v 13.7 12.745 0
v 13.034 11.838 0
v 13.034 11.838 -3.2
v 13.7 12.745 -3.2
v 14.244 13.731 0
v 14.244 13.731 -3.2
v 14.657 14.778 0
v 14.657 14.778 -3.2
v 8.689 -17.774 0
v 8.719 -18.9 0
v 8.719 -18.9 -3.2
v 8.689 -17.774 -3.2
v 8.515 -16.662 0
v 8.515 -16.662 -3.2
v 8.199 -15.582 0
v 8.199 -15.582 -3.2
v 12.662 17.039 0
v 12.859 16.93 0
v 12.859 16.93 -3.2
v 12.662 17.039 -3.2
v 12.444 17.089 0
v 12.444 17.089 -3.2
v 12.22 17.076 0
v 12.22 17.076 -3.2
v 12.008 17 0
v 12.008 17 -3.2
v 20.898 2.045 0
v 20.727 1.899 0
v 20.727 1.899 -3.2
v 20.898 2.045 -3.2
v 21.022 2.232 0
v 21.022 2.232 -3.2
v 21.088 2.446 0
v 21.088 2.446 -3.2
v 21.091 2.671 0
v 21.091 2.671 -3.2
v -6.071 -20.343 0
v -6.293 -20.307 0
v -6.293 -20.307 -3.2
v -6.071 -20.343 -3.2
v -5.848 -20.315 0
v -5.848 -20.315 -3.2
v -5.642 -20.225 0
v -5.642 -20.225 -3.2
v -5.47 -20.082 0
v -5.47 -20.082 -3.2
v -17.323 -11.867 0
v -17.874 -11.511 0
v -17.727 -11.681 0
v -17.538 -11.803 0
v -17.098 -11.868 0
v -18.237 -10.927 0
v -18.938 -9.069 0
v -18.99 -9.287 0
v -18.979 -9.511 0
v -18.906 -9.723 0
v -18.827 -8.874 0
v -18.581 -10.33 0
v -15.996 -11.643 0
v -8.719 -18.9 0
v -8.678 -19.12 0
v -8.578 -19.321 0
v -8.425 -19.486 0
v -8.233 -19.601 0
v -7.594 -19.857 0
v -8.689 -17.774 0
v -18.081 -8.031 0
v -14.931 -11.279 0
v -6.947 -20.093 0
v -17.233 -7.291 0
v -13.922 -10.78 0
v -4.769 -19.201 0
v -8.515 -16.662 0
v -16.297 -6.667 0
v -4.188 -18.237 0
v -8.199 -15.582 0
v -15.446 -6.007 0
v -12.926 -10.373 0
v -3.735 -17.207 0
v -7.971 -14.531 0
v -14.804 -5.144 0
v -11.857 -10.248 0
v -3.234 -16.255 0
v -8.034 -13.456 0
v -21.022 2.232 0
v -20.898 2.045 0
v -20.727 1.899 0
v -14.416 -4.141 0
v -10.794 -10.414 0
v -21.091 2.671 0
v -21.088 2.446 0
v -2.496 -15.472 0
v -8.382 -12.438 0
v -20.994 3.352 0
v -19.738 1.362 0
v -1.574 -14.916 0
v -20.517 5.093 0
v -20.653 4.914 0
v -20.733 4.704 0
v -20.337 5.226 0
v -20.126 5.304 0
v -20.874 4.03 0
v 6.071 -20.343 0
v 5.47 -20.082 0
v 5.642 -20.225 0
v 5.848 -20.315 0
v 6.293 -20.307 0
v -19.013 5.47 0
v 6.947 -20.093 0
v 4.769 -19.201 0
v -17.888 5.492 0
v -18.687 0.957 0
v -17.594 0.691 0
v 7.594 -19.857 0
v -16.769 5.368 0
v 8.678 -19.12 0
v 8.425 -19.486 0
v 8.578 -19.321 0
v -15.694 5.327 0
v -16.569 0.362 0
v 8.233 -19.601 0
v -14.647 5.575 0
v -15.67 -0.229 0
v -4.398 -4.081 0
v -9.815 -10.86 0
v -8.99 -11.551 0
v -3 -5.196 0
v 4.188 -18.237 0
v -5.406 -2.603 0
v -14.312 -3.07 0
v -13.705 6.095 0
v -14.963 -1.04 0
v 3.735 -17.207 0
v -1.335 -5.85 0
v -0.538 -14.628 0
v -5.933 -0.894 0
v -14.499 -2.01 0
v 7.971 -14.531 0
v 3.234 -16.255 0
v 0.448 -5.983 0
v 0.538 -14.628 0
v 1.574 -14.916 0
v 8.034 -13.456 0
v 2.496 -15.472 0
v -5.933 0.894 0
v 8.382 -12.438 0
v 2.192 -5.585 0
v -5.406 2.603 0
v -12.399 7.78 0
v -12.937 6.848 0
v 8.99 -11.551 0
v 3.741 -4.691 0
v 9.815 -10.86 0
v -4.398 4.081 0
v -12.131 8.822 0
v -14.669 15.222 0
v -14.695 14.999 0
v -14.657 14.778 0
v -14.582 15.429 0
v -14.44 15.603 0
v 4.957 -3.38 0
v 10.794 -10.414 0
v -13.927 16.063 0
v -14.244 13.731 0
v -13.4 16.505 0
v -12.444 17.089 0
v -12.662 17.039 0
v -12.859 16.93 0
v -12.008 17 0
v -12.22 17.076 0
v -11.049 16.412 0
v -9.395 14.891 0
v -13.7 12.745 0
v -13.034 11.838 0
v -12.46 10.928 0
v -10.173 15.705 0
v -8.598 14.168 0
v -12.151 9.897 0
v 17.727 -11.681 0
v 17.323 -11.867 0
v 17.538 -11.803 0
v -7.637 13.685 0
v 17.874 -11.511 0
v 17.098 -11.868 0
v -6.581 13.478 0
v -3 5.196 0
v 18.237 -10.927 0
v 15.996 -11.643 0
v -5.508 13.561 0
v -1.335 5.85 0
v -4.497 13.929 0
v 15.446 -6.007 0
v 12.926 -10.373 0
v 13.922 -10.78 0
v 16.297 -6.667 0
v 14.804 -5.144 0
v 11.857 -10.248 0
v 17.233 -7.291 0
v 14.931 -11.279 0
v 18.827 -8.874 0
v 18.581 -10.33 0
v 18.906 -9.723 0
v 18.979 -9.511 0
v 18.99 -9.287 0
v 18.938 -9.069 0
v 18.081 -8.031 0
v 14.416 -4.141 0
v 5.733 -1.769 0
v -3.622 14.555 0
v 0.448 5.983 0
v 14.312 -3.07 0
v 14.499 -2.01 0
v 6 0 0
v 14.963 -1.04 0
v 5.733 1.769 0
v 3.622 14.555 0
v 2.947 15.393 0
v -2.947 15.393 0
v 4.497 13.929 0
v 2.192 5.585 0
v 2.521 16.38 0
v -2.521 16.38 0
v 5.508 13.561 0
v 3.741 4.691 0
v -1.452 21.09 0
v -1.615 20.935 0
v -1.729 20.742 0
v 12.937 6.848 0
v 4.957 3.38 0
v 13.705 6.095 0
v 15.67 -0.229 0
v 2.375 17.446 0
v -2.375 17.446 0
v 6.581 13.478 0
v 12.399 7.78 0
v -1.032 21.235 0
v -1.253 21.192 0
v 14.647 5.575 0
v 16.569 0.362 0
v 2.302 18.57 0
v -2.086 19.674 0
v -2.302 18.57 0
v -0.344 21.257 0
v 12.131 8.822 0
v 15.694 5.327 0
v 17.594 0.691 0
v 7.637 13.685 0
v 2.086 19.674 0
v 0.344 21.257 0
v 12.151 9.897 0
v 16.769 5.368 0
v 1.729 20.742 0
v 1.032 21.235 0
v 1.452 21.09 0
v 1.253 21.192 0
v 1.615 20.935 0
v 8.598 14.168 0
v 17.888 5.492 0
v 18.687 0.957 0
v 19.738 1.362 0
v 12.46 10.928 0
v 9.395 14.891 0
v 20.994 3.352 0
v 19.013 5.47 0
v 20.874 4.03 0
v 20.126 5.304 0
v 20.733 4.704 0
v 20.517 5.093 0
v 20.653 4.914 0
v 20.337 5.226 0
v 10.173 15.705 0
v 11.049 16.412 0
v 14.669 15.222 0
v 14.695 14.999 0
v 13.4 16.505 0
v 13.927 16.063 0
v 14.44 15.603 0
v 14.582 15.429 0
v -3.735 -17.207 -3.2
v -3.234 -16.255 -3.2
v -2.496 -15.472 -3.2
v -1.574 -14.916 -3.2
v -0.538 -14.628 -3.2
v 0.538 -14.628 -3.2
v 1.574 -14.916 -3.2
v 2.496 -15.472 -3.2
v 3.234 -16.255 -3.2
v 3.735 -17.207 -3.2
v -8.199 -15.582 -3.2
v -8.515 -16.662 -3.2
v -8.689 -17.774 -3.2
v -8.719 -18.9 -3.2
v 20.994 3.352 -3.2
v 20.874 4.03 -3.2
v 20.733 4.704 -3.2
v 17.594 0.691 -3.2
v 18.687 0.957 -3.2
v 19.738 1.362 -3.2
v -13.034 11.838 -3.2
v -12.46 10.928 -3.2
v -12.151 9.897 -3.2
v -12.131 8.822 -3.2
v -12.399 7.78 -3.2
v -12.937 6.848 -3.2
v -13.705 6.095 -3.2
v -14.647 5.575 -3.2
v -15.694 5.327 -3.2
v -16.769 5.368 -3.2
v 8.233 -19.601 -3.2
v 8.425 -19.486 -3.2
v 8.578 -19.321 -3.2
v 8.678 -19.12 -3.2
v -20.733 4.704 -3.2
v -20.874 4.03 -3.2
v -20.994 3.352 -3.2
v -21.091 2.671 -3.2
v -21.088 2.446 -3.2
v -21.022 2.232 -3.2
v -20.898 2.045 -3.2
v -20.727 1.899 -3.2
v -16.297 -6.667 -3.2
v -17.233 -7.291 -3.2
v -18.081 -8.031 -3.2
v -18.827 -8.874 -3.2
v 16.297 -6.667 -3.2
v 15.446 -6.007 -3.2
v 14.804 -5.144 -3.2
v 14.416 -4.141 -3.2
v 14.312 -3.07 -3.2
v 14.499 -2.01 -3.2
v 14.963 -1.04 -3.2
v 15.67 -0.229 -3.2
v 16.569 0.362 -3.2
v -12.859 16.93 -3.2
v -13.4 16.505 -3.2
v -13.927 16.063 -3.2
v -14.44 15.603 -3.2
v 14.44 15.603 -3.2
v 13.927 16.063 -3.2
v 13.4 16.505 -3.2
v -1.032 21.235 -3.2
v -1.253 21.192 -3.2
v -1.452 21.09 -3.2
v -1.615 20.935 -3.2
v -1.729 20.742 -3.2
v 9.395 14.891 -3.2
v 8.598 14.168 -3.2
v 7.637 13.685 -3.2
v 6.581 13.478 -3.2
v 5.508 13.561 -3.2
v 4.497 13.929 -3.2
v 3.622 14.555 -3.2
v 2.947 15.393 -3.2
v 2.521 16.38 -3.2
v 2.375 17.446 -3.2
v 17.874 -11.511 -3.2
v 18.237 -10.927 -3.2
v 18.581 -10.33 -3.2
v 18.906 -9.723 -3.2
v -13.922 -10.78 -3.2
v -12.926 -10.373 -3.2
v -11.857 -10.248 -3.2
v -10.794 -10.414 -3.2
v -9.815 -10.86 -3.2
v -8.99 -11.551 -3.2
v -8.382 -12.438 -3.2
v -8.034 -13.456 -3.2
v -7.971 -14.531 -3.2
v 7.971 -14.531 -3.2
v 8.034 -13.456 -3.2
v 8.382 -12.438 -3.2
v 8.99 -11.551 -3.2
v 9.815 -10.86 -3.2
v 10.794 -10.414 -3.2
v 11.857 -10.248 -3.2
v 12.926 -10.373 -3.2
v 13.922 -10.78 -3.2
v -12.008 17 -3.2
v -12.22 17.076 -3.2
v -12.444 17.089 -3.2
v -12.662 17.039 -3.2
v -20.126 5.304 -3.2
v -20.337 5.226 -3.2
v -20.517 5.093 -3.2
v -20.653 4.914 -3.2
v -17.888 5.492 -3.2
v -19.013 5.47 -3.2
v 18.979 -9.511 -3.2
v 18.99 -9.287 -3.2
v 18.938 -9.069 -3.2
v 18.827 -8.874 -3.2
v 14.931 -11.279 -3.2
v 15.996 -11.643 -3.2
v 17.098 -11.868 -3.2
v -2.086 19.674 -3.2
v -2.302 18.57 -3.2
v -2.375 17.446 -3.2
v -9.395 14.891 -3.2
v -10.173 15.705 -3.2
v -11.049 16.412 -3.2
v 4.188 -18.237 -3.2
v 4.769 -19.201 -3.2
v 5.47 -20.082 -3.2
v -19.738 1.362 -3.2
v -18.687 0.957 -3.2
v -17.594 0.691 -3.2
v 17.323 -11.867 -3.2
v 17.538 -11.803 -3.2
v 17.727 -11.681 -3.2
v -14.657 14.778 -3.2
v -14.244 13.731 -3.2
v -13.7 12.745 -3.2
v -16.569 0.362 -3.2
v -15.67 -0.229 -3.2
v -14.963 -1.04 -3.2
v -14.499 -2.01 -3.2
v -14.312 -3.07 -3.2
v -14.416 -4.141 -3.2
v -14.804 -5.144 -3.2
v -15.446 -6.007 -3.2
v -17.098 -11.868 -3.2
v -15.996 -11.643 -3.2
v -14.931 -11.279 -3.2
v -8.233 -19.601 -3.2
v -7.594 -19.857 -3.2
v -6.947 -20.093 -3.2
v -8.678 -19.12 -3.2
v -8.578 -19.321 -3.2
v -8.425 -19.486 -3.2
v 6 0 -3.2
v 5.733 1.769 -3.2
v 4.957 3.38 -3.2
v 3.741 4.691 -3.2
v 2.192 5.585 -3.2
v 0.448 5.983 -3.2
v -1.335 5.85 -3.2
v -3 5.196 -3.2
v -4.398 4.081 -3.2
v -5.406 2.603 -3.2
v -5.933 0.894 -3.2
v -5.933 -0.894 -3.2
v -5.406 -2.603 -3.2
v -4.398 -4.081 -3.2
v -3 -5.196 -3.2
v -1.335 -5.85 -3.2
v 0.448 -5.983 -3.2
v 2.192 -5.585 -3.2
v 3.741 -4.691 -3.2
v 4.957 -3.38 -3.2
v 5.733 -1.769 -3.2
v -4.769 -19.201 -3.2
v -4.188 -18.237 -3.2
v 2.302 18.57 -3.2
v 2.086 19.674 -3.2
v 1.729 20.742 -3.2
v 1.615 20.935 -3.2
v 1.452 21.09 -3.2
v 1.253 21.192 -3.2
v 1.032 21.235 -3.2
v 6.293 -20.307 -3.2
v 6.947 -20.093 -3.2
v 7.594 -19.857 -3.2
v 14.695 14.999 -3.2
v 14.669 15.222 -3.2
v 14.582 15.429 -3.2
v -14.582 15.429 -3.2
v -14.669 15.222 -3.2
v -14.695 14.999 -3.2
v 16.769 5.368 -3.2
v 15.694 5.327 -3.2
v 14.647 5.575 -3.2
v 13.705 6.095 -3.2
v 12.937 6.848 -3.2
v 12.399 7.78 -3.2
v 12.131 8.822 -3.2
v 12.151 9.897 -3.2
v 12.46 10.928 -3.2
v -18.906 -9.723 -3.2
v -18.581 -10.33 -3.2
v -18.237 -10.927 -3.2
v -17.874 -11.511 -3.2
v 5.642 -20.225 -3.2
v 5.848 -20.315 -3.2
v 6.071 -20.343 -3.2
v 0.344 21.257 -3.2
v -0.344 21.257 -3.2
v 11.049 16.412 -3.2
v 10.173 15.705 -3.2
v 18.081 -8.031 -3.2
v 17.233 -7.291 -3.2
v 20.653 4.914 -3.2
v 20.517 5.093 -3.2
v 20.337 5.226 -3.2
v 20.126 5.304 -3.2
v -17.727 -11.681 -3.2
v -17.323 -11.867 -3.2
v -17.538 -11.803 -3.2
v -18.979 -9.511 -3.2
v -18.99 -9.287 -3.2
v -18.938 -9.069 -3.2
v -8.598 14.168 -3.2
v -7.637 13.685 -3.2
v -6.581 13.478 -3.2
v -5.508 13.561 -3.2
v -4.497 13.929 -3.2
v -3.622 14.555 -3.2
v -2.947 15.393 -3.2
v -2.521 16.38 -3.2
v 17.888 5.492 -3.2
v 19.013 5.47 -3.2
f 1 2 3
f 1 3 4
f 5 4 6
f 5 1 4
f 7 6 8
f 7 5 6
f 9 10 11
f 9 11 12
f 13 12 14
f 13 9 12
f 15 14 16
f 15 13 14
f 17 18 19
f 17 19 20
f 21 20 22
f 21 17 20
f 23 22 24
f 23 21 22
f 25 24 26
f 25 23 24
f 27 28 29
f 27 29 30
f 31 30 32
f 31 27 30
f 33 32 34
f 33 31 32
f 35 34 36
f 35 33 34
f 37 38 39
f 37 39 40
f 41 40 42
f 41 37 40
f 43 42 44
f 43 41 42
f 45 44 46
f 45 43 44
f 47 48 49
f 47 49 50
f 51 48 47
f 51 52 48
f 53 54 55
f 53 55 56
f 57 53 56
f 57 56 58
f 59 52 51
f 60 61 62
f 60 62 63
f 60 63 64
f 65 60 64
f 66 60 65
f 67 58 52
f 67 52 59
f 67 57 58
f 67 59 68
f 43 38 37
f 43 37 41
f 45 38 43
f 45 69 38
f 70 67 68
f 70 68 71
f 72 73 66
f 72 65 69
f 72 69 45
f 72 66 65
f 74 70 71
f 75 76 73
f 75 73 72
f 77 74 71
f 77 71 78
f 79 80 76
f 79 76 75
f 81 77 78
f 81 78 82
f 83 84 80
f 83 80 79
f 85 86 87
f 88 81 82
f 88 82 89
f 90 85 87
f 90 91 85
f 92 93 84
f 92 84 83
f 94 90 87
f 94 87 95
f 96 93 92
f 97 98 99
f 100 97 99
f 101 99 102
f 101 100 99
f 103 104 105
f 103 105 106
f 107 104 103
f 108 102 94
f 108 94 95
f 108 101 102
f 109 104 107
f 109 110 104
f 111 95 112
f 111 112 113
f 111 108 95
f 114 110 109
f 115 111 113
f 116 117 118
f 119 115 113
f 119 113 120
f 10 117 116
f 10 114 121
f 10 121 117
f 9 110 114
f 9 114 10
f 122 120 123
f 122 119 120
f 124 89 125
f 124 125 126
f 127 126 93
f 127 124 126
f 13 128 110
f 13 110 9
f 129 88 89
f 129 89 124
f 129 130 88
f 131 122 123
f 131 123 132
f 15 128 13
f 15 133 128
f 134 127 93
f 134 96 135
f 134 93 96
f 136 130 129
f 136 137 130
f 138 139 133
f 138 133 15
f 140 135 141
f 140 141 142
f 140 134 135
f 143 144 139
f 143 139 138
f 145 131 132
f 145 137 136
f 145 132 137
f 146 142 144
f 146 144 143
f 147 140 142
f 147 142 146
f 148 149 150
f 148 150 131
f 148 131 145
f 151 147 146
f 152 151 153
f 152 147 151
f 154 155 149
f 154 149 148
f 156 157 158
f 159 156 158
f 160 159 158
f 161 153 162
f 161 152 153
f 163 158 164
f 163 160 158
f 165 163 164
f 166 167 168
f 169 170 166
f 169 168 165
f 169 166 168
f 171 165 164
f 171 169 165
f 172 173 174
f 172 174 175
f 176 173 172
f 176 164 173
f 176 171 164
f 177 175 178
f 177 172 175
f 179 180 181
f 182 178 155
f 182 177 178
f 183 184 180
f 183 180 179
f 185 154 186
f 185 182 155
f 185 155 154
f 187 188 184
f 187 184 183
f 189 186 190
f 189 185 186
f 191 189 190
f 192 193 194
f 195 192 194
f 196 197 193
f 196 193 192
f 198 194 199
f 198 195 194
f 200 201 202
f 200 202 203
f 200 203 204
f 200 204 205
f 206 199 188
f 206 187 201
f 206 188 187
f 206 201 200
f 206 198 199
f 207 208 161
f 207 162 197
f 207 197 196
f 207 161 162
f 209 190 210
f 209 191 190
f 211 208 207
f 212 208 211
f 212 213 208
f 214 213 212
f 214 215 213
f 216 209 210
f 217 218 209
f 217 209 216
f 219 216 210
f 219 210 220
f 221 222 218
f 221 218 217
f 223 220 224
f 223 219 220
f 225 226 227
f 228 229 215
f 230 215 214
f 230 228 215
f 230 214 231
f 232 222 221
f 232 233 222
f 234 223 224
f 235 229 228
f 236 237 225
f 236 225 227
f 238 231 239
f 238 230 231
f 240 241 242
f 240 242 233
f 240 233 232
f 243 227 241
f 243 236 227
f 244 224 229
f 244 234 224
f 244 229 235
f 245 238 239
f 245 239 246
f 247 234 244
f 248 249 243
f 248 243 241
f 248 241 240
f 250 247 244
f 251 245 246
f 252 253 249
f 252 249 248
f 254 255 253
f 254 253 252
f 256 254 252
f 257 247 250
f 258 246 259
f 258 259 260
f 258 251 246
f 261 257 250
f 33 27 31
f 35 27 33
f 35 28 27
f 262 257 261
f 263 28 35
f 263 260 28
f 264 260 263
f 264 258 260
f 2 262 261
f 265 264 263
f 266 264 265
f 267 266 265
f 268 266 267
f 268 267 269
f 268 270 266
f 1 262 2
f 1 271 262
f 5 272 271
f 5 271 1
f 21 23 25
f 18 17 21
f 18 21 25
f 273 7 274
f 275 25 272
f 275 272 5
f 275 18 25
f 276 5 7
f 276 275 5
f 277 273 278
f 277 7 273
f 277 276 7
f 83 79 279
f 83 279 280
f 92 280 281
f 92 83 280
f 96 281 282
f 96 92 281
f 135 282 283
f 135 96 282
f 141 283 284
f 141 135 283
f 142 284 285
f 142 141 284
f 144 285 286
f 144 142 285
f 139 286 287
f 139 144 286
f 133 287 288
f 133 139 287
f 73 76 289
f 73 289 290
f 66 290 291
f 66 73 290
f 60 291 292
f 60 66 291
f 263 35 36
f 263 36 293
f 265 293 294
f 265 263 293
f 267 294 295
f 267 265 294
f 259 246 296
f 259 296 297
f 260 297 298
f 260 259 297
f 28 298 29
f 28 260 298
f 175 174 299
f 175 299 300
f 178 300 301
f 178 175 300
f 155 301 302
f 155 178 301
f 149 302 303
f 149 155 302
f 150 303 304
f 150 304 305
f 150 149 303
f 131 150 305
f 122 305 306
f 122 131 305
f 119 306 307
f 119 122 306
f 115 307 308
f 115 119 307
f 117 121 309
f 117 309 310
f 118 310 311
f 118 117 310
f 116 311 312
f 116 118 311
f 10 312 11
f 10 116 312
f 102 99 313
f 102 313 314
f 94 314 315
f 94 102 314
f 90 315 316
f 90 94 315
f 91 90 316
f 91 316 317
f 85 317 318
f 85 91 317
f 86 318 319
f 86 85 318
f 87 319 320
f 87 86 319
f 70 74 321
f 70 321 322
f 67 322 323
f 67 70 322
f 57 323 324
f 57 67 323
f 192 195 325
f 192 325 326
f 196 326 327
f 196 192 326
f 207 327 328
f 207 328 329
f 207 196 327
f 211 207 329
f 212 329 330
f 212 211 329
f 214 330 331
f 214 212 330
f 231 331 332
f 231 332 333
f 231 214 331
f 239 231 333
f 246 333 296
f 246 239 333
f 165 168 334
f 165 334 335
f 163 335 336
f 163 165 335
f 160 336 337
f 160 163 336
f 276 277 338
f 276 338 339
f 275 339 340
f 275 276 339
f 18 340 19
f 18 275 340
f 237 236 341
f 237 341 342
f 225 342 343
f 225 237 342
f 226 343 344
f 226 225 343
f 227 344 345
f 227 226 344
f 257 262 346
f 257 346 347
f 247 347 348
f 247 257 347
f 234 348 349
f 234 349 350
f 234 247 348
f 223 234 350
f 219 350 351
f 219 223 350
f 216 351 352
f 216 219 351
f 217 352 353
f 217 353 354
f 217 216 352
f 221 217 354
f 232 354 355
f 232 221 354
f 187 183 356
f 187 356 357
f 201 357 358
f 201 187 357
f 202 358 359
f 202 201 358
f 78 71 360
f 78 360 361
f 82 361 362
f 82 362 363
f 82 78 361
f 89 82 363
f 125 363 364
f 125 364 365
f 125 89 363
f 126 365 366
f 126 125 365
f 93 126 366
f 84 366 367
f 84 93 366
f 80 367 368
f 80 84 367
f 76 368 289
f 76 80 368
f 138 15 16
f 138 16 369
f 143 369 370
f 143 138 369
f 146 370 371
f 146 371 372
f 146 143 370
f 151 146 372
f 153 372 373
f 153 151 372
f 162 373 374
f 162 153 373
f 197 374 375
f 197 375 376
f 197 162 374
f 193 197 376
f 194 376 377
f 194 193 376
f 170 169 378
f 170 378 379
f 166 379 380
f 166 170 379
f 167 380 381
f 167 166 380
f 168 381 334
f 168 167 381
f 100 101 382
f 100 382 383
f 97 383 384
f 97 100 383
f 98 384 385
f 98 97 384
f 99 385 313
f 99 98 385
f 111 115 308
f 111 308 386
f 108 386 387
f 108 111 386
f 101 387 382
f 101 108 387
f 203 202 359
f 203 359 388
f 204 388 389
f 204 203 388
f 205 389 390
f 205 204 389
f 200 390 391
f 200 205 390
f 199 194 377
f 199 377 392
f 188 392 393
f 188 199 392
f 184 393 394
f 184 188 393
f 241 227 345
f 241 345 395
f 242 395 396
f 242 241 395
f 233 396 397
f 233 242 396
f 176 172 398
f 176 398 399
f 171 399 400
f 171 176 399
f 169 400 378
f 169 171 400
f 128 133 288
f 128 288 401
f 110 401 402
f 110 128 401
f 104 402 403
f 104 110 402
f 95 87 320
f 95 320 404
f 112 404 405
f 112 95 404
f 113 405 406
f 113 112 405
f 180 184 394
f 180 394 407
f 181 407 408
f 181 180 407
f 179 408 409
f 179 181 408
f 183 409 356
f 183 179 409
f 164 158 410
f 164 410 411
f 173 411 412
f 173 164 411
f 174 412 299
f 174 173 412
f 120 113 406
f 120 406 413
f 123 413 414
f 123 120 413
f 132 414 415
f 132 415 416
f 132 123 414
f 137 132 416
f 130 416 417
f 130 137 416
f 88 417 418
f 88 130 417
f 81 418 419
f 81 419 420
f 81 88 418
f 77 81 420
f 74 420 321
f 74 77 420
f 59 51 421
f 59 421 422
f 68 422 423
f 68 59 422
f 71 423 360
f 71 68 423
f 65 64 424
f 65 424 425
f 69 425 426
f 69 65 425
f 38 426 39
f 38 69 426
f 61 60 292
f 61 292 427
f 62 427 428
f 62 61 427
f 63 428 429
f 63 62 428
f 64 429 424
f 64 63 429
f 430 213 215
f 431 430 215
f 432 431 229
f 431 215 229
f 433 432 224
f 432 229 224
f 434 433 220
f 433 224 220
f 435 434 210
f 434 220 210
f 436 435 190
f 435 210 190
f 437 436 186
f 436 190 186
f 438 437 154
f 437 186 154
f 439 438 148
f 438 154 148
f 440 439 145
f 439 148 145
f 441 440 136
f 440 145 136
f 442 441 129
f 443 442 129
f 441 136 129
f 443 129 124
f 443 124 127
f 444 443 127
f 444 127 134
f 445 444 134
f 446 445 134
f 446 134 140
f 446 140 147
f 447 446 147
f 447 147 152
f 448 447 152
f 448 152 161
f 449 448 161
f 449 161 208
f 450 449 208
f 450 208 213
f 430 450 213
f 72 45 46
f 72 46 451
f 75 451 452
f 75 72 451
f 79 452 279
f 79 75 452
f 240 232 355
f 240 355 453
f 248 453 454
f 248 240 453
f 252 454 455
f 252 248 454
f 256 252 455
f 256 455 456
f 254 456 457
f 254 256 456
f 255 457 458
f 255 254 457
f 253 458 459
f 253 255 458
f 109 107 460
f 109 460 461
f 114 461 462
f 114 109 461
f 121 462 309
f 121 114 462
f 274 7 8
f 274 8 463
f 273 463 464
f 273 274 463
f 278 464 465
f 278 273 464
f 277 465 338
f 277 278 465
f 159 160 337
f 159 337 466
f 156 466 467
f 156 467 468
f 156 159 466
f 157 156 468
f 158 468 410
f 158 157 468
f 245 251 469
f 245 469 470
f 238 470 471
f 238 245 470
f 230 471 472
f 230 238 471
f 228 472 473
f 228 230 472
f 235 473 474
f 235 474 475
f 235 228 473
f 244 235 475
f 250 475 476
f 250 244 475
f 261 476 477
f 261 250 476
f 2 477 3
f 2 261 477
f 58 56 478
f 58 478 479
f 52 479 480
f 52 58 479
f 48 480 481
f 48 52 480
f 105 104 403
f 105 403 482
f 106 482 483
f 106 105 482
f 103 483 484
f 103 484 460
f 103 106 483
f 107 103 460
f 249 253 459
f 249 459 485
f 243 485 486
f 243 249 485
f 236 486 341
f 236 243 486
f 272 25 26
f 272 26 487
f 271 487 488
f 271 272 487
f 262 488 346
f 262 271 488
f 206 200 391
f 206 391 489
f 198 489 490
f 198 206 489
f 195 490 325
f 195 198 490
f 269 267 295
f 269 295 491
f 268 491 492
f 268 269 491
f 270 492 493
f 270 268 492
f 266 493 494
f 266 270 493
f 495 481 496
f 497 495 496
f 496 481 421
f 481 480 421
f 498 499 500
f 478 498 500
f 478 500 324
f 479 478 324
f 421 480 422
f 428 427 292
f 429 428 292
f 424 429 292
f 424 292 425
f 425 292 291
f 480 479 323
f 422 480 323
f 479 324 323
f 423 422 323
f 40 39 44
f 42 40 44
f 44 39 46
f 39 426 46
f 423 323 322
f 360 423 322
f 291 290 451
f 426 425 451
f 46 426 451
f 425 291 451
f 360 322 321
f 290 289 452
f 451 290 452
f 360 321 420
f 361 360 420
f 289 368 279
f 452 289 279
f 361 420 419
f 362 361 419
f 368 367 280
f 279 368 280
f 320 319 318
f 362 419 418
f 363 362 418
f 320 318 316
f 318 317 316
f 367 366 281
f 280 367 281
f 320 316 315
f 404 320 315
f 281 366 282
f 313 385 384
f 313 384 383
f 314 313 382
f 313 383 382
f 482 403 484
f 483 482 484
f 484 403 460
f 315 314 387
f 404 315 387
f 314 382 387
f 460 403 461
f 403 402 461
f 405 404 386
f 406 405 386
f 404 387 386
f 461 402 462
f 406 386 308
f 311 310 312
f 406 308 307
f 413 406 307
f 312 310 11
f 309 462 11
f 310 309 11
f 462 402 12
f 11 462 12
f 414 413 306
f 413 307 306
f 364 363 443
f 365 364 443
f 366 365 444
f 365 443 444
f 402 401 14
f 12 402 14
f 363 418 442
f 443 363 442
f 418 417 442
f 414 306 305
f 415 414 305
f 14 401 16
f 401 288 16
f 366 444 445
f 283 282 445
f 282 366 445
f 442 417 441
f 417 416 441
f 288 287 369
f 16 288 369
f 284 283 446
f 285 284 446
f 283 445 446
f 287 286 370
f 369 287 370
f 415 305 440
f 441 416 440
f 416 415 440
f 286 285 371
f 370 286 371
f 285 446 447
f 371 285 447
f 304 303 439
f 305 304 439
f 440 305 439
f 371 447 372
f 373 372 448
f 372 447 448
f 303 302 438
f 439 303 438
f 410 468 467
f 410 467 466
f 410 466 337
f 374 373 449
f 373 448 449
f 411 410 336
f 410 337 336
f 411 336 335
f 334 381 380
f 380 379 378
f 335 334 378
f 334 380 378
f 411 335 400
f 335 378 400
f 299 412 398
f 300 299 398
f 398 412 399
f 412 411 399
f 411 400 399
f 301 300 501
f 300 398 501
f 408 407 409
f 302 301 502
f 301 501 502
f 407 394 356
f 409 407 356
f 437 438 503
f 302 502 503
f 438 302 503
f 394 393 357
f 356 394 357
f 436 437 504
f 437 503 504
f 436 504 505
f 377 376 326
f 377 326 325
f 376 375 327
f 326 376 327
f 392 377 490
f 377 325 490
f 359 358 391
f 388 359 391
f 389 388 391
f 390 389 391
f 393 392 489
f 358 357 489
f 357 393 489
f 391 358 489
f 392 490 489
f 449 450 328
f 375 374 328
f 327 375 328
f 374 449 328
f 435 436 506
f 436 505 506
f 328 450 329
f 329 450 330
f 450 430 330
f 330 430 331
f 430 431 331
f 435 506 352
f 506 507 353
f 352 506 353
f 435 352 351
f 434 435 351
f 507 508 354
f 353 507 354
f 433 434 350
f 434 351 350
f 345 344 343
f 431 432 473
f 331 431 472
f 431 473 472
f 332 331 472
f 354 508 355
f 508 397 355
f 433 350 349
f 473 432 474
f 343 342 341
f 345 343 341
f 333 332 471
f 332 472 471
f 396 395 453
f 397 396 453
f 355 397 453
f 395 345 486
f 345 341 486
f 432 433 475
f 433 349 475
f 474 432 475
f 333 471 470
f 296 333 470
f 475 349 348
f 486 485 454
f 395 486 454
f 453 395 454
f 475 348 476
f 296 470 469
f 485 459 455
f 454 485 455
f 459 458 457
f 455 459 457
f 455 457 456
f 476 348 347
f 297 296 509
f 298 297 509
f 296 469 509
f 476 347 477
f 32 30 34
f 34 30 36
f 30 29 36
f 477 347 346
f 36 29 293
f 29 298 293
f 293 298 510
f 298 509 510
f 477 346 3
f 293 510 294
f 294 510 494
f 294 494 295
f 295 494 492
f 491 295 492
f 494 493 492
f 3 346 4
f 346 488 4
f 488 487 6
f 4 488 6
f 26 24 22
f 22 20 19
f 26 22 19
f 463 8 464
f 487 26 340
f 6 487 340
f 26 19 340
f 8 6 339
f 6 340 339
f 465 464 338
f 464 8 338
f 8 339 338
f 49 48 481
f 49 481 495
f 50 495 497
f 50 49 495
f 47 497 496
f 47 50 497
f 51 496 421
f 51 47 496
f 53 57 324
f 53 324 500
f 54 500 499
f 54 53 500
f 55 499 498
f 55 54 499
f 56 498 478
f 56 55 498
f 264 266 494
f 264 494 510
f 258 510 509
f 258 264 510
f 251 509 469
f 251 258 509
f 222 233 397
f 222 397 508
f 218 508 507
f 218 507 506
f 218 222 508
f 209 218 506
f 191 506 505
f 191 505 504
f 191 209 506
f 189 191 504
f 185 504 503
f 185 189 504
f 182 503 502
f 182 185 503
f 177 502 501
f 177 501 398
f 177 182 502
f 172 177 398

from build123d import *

# Parameters (mm, degrees)
BOSS_EXTRUDE1_DEPTH = 3.2
SKETCH2_R           = 6
CUT_EXTRUDE1_DEPTH  = 10


with BuildPart() as part:
    # Sketch1 → Boss-Extrude1 (new body)
    with BuildSketch(Plane.XY):
        with BuildLine():
            ThreePointArc((2.3749, 17.446481614), (2.211827147, 19.125468185), (1.72870442, 20.741692518))
            ThreePointArc((1.72870442, 20.741692518), (1.452377955, 21.089746522), (1.03228327, 21.234723622))
            ThreePointArc((1.03228327, 21.234723622), (0, 21.2598), (-1.03228327, 21.234723622))
            ThreePointArc((-1.03228327, 21.234723622), (-1.452377955, 21.089746522), (-1.72870442, 20.741692518))
            ThreePointArc((-1.72870442, 20.741692518), (-2.211827147, 19.125468185), (-2.3749, 17.446481614))
            ThreePointArc((-2.3749, 17.446481614), (-4.990435728, 13.711109477), (-9.395103266, 14.891336586))
            ThreePointArc((-9.395103266, 14.891336586), (-10.599256083, 16.07269371), (-12.00823854, 17.000248076))
            ThreePointArc((-12.00823854, 17.000248076), (-12.443641694, 17.089253684), (-12.858642377, 16.930280927))
            ThreePointArc((-12.858642377, 16.930280927), (-13.665536024, 16.285951652), (-14.440192102, 15.603203136))
            ThreePointArc((-14.440192102, 15.603203136), (-14.668813817, 15.222112575), (-14.656767369, 14.777868512))
            ThreePointArc((-14.656767369, 14.777868512), (-13.987971874, 13.22922354), (-13.033661162, 11.838223998))
            ThreePointArc((-13.033661162, 11.838223998), (-12.636226845, 7.295528971), (-16.769033299, 5.368369672))
            ThreePointArc((-16.769033299, 5.368369672), (-18.450829595, 5.49932722), (-20.12639323, 5.304198623))
            ThreePointArc((-20.12639323, 5.304198623), (-20.517143098, 5.092509122), (-20.732866347, 4.703971627))
            ThreePointArc((-20.732866347, 4.703971627), (-20.936815867, 3.691725528), (-21.091374564, 2.670770493))
            ThreePointArc((-21.091374564, 2.670770493), (-21.021548669, 2.23188298), (-20.726765974, 1.899315592))
            ThreePointArc((-20.726765974, 1.899315592), (-19.218989102, 1.142878174), (-17.593827413, 0.690729806))
            ThreePointArc((-17.593827413, 0.690729806), (-14.369386985, -2.533710622), (-16.296546284, -6.666517075))
            ThreePointArc((-16.296546284, -6.666517075), (-17.669054881, -7.647235594), (-18.827184848, -8.873744316))
            ThreePointArc((-18.827184848, -8.873744316), (-18.990445225, -9.287077056), (-18.905951734, -9.723378276))
            ThreePointArc((-18.905951734, -9.723378276), (-18.411526879, -10.6299), (-17.873668464, -11.511345346))
            ThreePointArc((-17.873668464, -11.511345346), (-17.538067269, -11.802669466), (-17.098480428, -11.867948202))
            ThreePointArc((-17.098480428, -11.867948202), (-15.457227734, -11.478232591), (-13.921646284, -10.779964538))
            ThreePointArc((-13.921646284, -10.779964538), (-9.378951257, -11.177398855), (-8.198724147, -15.582066393))
            ThreePointArc((-8.198724147, -15.582066393), (-8.619733019, -17.215571885), (-8.718527435, -18.899563668))
            ThreePointArc((-8.718527435, -18.899563668), (-8.577906975, -19.321136664), (-8.232732188, -19.60105142))
            ThreePointArc((-8.232732188, -19.60105142), (-7.271279843, -19.977677179), (-6.292674246, -20.307174764))
            ThreePointArc((-6.292674246, -20.307174764), (-5.848329281, -20.314621697), (-5.469625861, -20.082067135))
            ThreePointArc((-5.469625861, -20.082067135), (-4.462857721, -18.728550761), (-3.735372137, -17.206593669))
            ThreePointArc((-3.735372137, -17.206593669), (0, -14.591057941), (3.735372137, -17.206593669))
            ThreePointArc((3.735372137, -17.206593669), (4.462857721, -18.728550761), (5.469625861, -20.082067135))
            ThreePointArc((5.469625861, -20.082067135), (5.848329281, -20.314621697), (6.292674246, -20.307174764))
            ThreePointArc((6.292674246, -20.307174764), (7.271279843, -19.977677179), (8.232732188, -19.60105142))
            ThreePointArc((8.232732188, -19.60105142), (8.577906975, -19.321136664), (8.718527435, -18.899563668))
            ThreePointArc((8.718527435, -18.899563668), (8.619733019, -17.215571885), (8.198724147, -15.582066393))
            ThreePointArc((8.198724147, -15.582066393), (9.378951257, -11.177398855), (13.921646284, -10.779964538))
            ThreePointArc((13.921646284, -10.779964538), (15.457227734, -11.478232591), (17.098480428, -11.867948202))
            ThreePointArc((17.098480428, -11.867948202), (17.538067269, -11.802669466), (17.873668464, -11.511345346))
            ThreePointArc((17.873668464, -11.511345346), (18.411526879, -10.6299), (18.905951734, -9.723378276))
            ThreePointArc((18.905951734, -9.723378276), (18.990445225, -9.287077056), (18.827184848, -8.873744316))
            ThreePointArc((18.827184848, -8.873744316), (17.669054881, -7.647235594), (16.296546284, -6.666517075))
            ThreePointArc((16.296546284, -6.666517075), (14.369386985, -2.533710622), (17.593827413, 0.690729806))
            ThreePointArc((17.593827413, 0.690729806), (19.218989102, 1.142878174), (20.726765974, 1.899315592))
            ThreePointArc((20.726765974, 1.899315592), (21.021548669, 2.23188298), (21.091374564, 2.670770493))
            ThreePointArc((21.091374564, 2.670770493), (20.936815867, 3.691725528), (20.732866347, 4.703971627))
            ThreePointArc((20.732866347, 4.703971627), (20.517143098, 5.092509122), (20.12639323, 5.304198623))
            ThreePointArc((20.12639323, 5.304198623), (18.450829595, 5.49932722), (16.769033299, 5.368369672))
            ThreePointArc((16.769033299, 5.368369672), (12.636226845, 7.295528971), (13.033661162, 11.838223998))
            ThreePointArc((13.033661162, 11.838223998), (13.987971874, 13.22922354), (14.656767369, 14.777868512))
            ThreePointArc((14.656767369, 14.777868512), (14.668813817, 15.222112575), (14.440192102, 15.603203136))
            ThreePointArc((14.440192102, 15.603203136), (13.665536024, 16.285951652), (12.858642377, 16.930280927))
            ThreePointArc((12.858642377, 16.930280927), (12.443641694, 17.089253684), (12.00823854, 17.000248076))
            ThreePointArc((12.00823854, 17.000248076), (10.599256083, 16.07269371), (9.395103266, 14.891336586))
            ThreePointArc((9.395103266, 14.891336586), (4.990435728, 13.711109477), (2.3749, 17.446481614))
        make_face()
    extrude(amount=-BOSS_EXTRUDE1_DEPTH)

    # Sketch2 → Cut-Extrude1 (cut)
    with BuildSketch(Plane.XY):
        Circle(SKETCH2_R)
    extrude(amount=-CUT_EXTRUDE1_DEPTH, mode=Mode.SUBTRACT)


solid = part.part
